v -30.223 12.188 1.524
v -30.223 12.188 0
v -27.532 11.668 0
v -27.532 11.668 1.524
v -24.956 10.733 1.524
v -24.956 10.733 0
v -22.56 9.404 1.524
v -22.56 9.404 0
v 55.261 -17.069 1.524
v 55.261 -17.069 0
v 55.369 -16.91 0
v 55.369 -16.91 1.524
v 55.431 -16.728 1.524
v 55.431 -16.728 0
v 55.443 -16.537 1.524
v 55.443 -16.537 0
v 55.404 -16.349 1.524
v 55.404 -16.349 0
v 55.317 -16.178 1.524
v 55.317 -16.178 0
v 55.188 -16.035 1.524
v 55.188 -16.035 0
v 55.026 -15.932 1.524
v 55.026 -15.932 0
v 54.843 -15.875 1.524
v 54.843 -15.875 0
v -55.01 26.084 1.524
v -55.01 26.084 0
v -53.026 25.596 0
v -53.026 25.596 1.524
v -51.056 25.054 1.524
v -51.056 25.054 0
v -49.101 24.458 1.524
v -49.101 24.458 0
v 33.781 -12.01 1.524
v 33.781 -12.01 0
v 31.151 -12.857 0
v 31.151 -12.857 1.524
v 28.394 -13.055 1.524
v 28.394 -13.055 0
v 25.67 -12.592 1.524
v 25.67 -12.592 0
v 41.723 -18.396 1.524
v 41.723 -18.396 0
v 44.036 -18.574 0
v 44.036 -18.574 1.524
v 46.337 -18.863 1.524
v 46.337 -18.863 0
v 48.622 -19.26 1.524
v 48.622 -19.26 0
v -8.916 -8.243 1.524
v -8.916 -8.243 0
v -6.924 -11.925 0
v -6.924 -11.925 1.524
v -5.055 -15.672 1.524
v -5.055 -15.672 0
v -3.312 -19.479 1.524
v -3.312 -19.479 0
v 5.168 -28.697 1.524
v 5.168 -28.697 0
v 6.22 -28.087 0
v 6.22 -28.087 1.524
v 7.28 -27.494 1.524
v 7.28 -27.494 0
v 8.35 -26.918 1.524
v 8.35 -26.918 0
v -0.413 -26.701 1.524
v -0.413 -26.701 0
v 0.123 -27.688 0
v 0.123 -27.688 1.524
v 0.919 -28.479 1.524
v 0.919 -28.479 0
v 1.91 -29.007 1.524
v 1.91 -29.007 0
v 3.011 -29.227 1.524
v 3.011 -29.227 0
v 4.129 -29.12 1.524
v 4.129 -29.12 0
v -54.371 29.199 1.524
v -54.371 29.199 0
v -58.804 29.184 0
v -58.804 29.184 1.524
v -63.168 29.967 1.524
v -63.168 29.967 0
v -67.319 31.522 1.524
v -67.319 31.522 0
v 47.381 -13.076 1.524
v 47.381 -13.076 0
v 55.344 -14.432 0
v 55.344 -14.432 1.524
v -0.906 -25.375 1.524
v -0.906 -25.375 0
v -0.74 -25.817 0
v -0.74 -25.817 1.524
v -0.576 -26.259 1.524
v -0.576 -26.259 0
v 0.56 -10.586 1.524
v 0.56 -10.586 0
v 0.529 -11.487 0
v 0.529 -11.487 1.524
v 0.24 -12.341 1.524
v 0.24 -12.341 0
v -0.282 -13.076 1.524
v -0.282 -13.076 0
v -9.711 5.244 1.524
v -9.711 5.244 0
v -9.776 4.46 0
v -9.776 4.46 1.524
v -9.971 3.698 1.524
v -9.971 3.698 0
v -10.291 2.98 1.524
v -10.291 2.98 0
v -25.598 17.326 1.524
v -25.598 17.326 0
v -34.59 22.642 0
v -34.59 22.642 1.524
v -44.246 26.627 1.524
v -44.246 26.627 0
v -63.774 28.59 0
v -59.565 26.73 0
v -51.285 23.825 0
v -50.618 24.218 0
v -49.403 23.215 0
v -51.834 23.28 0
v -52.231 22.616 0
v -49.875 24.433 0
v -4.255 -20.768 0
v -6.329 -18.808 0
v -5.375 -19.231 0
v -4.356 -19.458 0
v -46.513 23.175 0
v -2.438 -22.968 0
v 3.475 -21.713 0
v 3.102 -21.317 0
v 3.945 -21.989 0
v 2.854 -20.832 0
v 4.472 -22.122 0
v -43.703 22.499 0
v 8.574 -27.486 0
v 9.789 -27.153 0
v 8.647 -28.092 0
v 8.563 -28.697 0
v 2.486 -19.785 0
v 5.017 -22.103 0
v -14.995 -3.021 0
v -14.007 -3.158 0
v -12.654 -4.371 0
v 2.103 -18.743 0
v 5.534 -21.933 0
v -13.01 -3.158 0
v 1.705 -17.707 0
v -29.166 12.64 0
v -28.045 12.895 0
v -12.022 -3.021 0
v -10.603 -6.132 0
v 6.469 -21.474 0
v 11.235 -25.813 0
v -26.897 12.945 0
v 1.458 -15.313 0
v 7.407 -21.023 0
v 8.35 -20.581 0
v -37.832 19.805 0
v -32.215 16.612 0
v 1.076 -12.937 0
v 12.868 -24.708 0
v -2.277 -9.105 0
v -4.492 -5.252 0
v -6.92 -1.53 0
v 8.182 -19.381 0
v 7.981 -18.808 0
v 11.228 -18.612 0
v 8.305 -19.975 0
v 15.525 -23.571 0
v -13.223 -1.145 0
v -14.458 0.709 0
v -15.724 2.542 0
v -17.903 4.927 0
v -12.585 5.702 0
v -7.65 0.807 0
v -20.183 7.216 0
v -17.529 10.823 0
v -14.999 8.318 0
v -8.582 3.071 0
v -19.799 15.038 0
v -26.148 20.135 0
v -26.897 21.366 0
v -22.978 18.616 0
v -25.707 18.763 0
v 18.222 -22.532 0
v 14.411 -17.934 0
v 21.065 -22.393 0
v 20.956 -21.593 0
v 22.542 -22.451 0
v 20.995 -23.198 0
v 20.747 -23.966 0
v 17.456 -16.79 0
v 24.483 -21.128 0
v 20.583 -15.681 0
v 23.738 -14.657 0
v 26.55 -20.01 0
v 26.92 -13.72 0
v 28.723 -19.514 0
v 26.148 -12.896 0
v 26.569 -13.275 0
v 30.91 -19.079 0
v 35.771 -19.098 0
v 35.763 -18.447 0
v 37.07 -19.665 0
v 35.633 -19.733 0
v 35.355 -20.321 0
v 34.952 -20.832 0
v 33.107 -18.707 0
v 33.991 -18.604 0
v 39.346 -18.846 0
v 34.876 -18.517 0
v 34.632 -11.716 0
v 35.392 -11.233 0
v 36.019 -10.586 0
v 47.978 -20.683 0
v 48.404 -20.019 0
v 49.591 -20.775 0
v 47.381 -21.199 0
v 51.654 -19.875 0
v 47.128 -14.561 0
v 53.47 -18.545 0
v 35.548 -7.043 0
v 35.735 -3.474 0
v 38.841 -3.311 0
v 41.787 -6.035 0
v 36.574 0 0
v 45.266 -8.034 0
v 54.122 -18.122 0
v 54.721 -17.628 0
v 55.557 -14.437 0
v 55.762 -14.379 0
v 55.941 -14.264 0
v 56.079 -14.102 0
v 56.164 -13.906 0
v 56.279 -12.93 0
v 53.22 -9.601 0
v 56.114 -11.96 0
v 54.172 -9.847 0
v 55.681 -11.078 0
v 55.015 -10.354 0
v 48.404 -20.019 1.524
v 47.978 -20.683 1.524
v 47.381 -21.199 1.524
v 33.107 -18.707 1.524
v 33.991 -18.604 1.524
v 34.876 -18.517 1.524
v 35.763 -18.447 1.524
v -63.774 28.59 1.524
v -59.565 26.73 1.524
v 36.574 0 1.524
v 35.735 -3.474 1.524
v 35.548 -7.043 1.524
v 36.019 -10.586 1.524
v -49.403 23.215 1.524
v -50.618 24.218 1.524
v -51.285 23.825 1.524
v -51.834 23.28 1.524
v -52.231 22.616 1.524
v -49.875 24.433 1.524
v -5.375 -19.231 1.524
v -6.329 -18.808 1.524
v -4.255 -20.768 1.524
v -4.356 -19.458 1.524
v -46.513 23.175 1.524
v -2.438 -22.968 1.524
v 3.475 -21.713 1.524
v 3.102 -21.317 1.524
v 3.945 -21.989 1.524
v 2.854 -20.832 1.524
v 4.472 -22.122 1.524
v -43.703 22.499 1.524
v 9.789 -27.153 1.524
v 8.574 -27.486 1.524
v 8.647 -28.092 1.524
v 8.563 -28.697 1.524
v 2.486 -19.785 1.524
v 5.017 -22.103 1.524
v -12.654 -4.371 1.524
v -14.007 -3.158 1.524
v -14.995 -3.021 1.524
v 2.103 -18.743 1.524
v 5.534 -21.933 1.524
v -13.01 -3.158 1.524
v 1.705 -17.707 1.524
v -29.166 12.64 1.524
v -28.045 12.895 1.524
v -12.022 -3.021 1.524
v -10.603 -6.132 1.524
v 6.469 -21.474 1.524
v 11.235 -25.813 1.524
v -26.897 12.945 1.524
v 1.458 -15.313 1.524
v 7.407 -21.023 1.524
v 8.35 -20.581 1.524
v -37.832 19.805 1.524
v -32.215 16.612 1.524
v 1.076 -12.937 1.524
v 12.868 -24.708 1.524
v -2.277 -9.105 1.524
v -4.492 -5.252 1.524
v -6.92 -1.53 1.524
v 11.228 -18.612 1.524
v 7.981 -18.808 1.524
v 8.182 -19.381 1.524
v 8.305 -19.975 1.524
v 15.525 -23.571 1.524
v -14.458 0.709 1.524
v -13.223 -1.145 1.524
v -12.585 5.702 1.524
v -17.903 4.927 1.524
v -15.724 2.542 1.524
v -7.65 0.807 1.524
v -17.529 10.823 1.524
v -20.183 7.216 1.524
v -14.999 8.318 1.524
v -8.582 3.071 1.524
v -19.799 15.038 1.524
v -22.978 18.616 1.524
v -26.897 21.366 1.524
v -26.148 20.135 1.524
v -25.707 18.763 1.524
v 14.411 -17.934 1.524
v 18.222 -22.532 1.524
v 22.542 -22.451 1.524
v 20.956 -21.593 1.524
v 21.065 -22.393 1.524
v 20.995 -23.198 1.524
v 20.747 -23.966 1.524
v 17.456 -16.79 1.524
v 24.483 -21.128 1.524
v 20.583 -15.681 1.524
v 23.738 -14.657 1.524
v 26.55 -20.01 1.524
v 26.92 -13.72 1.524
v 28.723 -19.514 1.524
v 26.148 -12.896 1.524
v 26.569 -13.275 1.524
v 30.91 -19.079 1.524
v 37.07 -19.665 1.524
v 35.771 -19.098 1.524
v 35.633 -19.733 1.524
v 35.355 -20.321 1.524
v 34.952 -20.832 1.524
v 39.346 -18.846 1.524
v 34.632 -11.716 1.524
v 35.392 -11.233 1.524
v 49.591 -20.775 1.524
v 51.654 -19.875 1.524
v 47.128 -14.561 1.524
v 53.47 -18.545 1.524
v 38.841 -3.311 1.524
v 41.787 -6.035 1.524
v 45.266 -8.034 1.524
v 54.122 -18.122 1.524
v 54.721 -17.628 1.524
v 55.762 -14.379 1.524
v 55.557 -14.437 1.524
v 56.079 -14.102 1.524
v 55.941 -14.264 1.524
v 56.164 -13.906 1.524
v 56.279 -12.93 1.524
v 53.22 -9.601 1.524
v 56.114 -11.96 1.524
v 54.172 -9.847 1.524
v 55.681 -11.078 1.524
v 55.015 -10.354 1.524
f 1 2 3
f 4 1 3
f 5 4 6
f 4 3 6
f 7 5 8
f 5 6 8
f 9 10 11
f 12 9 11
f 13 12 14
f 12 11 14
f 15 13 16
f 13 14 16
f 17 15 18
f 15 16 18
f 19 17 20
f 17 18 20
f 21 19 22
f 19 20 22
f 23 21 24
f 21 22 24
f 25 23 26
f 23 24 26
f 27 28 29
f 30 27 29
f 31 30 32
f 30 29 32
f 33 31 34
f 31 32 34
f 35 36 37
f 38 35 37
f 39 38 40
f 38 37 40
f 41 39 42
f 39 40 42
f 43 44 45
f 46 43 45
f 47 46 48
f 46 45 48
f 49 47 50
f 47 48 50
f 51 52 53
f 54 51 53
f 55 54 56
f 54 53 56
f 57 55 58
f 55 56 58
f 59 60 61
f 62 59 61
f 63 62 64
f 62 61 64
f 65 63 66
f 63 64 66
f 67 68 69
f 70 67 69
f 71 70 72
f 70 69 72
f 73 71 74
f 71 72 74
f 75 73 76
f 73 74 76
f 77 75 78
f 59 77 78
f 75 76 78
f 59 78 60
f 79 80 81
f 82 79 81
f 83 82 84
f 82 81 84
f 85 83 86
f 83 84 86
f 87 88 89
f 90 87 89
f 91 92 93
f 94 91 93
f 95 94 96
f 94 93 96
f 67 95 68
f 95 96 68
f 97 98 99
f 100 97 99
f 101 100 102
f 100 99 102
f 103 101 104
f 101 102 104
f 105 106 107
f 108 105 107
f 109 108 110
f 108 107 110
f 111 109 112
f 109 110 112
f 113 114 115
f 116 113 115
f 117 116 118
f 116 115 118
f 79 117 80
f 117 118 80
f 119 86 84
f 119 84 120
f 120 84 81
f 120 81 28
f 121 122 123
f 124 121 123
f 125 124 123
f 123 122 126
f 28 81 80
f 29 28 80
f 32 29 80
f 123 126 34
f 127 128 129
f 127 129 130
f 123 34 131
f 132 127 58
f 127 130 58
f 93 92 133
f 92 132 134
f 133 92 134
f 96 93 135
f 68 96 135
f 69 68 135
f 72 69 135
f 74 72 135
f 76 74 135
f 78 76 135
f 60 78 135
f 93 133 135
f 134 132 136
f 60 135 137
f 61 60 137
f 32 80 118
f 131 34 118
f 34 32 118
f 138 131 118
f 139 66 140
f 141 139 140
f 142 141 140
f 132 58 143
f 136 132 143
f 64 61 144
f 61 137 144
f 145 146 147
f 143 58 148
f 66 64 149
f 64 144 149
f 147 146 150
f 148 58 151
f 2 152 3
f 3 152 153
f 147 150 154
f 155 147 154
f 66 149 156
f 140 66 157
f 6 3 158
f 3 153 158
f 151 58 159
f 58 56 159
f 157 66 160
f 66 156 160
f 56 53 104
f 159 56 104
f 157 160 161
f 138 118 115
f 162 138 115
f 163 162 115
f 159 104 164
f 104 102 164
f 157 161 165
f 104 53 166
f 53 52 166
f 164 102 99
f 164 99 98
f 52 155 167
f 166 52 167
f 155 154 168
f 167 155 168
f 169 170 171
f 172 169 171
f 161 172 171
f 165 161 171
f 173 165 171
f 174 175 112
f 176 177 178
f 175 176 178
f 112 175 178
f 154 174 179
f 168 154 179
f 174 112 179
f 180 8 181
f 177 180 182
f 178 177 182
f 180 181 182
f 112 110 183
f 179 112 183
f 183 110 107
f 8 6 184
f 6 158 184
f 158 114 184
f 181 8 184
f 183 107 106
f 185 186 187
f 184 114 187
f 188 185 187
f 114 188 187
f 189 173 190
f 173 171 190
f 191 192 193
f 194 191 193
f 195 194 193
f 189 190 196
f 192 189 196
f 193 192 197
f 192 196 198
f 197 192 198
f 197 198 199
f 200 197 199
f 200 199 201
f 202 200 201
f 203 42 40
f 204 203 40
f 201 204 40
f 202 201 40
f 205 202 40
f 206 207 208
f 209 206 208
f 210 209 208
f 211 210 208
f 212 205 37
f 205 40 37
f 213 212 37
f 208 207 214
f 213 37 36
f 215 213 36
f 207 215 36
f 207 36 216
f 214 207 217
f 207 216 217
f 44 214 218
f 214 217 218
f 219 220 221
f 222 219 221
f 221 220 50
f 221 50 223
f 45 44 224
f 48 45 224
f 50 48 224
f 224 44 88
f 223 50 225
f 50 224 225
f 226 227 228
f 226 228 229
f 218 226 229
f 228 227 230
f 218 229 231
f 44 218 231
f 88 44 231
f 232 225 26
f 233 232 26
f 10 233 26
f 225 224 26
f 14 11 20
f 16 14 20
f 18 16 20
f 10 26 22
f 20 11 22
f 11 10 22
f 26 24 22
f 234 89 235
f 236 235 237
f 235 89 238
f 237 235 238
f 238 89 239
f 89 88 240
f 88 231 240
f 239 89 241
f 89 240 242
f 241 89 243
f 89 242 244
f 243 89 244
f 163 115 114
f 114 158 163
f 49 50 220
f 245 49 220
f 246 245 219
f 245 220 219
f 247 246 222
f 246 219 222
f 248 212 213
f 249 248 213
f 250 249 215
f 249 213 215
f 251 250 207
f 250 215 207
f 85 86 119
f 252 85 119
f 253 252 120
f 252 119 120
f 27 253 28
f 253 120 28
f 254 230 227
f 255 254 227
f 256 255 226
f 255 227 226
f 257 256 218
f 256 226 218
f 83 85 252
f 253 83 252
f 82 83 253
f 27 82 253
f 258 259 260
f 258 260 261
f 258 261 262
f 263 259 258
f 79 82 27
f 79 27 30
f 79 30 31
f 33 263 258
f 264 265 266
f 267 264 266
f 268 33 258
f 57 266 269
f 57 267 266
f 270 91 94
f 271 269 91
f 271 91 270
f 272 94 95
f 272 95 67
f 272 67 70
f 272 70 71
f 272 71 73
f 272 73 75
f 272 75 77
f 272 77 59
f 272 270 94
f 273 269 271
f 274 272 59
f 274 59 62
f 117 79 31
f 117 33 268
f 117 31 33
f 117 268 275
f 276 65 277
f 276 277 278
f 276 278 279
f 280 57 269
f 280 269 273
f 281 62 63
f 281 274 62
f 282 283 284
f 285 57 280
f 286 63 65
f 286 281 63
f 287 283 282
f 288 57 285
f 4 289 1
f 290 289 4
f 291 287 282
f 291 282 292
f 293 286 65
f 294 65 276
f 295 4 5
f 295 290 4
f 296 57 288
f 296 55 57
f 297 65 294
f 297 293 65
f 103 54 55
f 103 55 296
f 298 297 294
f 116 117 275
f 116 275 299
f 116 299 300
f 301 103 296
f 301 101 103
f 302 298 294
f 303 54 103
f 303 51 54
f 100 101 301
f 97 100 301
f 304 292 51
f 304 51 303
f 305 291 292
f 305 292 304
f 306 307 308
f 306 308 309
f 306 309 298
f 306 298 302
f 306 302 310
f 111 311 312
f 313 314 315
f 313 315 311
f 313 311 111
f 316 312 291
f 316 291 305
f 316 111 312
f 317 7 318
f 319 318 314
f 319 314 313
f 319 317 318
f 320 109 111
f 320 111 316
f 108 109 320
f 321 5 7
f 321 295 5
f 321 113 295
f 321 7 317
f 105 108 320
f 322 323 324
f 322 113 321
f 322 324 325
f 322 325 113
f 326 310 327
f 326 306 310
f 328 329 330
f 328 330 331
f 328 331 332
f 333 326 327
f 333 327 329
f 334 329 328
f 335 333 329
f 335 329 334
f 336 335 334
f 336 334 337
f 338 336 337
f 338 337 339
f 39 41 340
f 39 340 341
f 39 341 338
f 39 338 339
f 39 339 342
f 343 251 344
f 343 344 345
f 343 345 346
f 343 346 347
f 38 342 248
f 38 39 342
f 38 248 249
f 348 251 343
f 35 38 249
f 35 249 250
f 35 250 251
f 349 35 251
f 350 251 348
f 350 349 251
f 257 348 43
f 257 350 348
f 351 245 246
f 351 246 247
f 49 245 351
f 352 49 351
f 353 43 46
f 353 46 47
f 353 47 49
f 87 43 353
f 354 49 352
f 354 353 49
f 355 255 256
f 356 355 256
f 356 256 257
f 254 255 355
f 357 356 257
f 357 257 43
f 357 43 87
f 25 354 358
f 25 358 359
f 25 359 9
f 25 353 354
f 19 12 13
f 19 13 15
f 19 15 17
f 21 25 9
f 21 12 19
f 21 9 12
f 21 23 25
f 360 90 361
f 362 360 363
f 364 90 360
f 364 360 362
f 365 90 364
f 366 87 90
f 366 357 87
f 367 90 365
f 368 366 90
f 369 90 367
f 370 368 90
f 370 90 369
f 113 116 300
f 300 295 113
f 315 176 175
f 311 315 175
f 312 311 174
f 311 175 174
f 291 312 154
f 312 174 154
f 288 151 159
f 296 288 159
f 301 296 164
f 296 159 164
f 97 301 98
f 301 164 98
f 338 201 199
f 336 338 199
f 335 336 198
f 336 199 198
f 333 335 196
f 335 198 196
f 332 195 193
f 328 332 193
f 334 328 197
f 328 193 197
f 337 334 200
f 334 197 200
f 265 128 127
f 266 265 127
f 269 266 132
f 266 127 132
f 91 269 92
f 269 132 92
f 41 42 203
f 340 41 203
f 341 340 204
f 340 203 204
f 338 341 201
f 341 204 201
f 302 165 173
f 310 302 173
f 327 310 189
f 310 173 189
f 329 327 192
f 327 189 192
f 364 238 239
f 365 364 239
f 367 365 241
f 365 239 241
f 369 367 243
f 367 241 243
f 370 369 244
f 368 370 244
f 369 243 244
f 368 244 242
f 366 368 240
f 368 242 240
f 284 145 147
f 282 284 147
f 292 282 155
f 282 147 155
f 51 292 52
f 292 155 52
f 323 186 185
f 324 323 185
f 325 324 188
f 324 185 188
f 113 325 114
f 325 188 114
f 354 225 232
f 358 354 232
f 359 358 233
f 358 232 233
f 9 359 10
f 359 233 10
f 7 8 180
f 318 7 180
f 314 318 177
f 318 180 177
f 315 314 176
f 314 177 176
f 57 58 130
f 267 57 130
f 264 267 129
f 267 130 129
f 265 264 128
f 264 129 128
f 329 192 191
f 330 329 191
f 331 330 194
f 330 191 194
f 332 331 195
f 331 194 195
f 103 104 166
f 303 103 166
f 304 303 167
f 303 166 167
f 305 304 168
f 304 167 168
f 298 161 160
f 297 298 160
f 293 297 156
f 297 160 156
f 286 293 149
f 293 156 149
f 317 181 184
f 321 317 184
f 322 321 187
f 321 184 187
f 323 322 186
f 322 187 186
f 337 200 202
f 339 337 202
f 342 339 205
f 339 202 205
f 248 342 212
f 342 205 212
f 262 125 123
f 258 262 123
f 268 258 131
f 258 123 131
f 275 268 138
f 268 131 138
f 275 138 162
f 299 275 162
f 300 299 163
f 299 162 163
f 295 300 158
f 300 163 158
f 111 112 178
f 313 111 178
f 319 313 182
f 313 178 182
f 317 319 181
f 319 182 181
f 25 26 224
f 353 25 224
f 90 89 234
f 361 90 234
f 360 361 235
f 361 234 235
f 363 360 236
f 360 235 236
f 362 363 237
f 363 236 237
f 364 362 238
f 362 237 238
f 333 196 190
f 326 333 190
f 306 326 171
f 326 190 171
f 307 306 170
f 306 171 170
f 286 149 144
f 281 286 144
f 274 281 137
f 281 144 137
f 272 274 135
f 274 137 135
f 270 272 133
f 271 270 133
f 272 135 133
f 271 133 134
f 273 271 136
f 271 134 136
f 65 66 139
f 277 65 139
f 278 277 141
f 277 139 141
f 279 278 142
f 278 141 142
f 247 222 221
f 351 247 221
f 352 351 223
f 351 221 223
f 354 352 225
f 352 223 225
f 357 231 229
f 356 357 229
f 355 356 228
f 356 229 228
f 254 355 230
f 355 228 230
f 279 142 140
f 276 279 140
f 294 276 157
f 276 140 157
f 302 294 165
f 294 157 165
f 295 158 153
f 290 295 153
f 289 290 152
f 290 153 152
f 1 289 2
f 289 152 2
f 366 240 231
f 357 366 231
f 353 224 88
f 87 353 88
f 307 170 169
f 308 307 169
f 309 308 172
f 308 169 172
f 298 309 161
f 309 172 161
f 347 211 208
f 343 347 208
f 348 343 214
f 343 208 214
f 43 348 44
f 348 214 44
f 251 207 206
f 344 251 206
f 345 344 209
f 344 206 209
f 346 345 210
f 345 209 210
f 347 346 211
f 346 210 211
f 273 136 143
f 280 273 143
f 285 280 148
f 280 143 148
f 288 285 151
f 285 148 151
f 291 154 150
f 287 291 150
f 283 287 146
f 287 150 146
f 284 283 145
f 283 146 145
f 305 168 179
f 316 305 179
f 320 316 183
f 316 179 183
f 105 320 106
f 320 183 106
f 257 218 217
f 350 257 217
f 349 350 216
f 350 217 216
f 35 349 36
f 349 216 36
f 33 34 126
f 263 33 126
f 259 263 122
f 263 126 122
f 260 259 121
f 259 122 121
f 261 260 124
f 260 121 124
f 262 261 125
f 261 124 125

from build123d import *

# Parameters (mm, degrees)
BOSS_EXTRUDE1_DEPTH = 1.524


with BuildPart() as part:
    # Sketch1 → Boss-Extrude1 (new body)
    with BuildSketch(Plane.XY):
        with BuildLine():
            Line((47.381308576, -13.076354562), (55.343944742, -14.432422978))
            ThreePointArc((55.343944742, -14.432422978), (55.855819335, -14.328185498), (56.163893215, -13.906318771))
            ThreePointArc((56.163893215, -13.906318771), (55.680504041, -11.077688455), (53.220198686, -9.600626466))
            Line((53.220198686, -9.600626466), (45.266067061, -8.034115775))
            ThreePointArc((45.266067061, -8.034115775), (40.237375781, -4.755718158), (36.574211612, 0))
            ThreePointArc((36.574211612, 0), (35.55871494, -5.254533576), (36.018806888, -10.586481811))
            ThreePointArc((36.018806888, -10.586481811), (35.025995436, -11.496620285), (33.780750037, -12.009836144))
            ThreePointArc((33.780750037, -12.009836144), (29.778374213, -13.039276401), (25.669954537, -12.592457382))
            ThreePointArc((25.669954537, -12.592457382), (26.366552456, -13.076757004), (26.920206789, -13.719611314))
            ThreePointArc((26.920206789, -13.719611314), (22.157152762, -15.15851527), (17.456411215, -16.789514096))
            ThreePointArc((17.456411215, -16.789514096), (12.832168531, -18.332197491), (7.980688074, -18.808254041))
            ThreePointArc((7.980688074, -18.808254041), (8.253415585, -19.676221582), (8.349810899, -20.580907104))
            ThreePointArc((8.349810899, -20.580907104), (6.937406163, -21.247776917), (5.53361242, -21.932587557))
            ThreePointArc((5.53361242, -21.932587557), (3.944680946, -21.988663657), (2.853783543, -20.83203467))
            ThreePointArc((2.853783543, -20.83203467), (2.29585657, -19.263543096), (1.704966772, -17.707169885))
            ThreePointArc((1.704966772, -17.707169885), (1.284069131, -14.122482995), (0.560307739, -10.586481811))
            ThreePointArc((0.560307739, -10.586481811), (0.415674848, -11.924982959), (-0.282069682, -13.076354562))
            ThreePointArc((-0.282069682, -13.076354562), (-3.357054523, -7.162746337), (-6.920105474, -1.52972211))
            ThreePointArc((-6.920105474, -1.52972211), (-8.0910802, 1.949544484), (-9.710699696, 5.243980782))
            ThreePointArc((-9.710699696, 5.243980782), (-9.857305852, 4.075018277), (-10.290972629, 2.979618885))
            ThreePointArc((-10.290972629, 2.979618885), (-13.777130717, 7.023766683), (-17.528779794, 10.822919067))
            ThreePointArc((-17.528779794, 10.822919067), (-21.284368064, 16.919530678), (-26.897153204, 21.365850433))
            ThreePointArc((-26.897153204, 21.365850433), (-25.887369361, 19.461878078), (-25.598425379, 17.326161451))
            ThreePointArc((-25.598425379, 17.326161451), (-39.347249709, 24.806966458), (-54.370546376, 29.199365714))
            ThreePointArc((-54.370546376, 29.199365714), (-61.003451809, 29.476578966), (-67.319072822, 31.522358252))
            ThreePointArc((-67.319072822, 31.522358252), (-61.733688319, 27.51480849), (-55.009920851, 26.08375078))
            ThreePointArc((-55.009920851, 26.08375078), (-52.038783927, 25.331807522), (-49.101103933, 24.458246116))
            ThreePointArc((-49.101103933, 24.458246116), (-50.963404132, 24.042209603), (-52.230913262, 22.615791355))
            ThreePointArc((-52.230913262, 22.615791355), (-47.957226248, 23.275149282), (-43.703205331, 22.498966559))
            ThreePointArc((-43.703205331, 22.498966559), (-34.98884104, 18.269729883), (-26.897153204, 12.945147661))
            ThreePointArc((-26.897153204, 12.945147661), (-28.611374467, 12.792404738), (-30.222607976, 12.187581193))
            ThreePointArc((-30.222607976, 12.187581193), (-26.225509878, 11.251375507), (-22.559534857, 9.403700904))
            ThreePointArc((-22.559534857, 9.403700904), (-19.030321473, 6.083870505), (-15.72447016, 2.541559382))
            ThreePointArc((-15.72447016, 2.541559382), (-13.836348231, -0.215104475), (-12.02203426, -3.020895781))
            ThreePointArc((-12.02203426, -3.020895781), (-13.508524403, -3.175087526), (-14.995014547, -3.020895781))
            ThreePointArc((-14.995014547, -3.020895781), (-11.58739515, -5.203150516), (-8.916043995, -8.242556493))
            ThreePointArc((-8.916043995, -8.242556493), (-5.974041698, -13.791075709), (-3.312350182, -19.479383127))
            ThreePointArc((-3.312350182, -19.479383127), (-4.870972445, -19.369578502), (-6.329147764, -18.808254041))
            ThreePointArc((-6.329147764, -18.808254041), (-3.312350182, -21.839623943), (-0.906453557, -25.375431145))
            ThreePointArc((-0.906453557, -25.375431145), (-0.657734758, -26.037552601), (-0.412739096, -26.701060692))
            ThreePointArc((-0.412739096, -26.701060692), (1.91016195, -29.006645717), (5.168319653, -28.696807117))
            ThreePointArc((5.168319653, -28.696807117), (6.748763707, -27.788827847), (8.349810899, -26.917692008))
            ThreePointArc((8.349810899, -26.917692008), (8.630214839, -27.78643645), (8.562623992, -28.696807117))
            ThreePointArc((8.562623992, -28.696807117), (10.486664845, -26.455513742), (12.868412887, -24.70834304))
            ThreePointArc((12.868412887, -24.70834304), (16.869160672, -23.03916113), (20.955745156, -21.592793838))
            ThreePointArc((20.955745156, -21.592793838), (21.05258172, -22.797241034), (20.746541516, -23.966176344))
            ThreePointArc((20.746541516, -23.966176344), (23.495531579, -21.764324116), (26.549791209, -20.010300822))
            ThreePointArc((26.549791209, -20.010300822), (29.81474898, -19.288764723), (33.107408372, -18.706563972))
            ThreePointArc((33.107408372, -18.706563972), (34.43330114, -18.558524355), (35.762761976, -18.446984027))
            ThreePointArc((35.762761976, -18.446984027), (35.632573955, -19.733193435), (34.951522192, -20.83203467))
            ThreePointArc((34.951522192, -20.83203467), (38.192011454, -19.210457415), (41.722919829, -18.396228022))
            ThreePointArc((41.722919829, -18.396228022), (45.188062045, -18.704651863), (48.622209673, -19.26049889))
            ThreePointArc((48.622209673, -19.26049889), (48.214896908, -20.366352247), (47.381308576, -21.199386357))
            ThreePointArc((47.381308576, -21.199386357), (50.647879824, -20.381891812), (53.469866719, -18.544726873))
            ThreePointArc((53.469866719, -18.544726873), (54.428390669, -17.883217687), (55.261101332, -17.068996882))
            ThreePointArc((55.261101332, -17.068996882), (55.403709497, -16.34876081), (54.842730354, -15.875073687))
            Line((54.842730354, -15.875073687), (47.128232405, -14.561068095))
            Line((47.128232405, -14.561068095), (47.381308576, -13.076354562))
        make_face()
    extrude(amount=BOSS_EXTRUDE1_DEPTH)


solid = part.part
